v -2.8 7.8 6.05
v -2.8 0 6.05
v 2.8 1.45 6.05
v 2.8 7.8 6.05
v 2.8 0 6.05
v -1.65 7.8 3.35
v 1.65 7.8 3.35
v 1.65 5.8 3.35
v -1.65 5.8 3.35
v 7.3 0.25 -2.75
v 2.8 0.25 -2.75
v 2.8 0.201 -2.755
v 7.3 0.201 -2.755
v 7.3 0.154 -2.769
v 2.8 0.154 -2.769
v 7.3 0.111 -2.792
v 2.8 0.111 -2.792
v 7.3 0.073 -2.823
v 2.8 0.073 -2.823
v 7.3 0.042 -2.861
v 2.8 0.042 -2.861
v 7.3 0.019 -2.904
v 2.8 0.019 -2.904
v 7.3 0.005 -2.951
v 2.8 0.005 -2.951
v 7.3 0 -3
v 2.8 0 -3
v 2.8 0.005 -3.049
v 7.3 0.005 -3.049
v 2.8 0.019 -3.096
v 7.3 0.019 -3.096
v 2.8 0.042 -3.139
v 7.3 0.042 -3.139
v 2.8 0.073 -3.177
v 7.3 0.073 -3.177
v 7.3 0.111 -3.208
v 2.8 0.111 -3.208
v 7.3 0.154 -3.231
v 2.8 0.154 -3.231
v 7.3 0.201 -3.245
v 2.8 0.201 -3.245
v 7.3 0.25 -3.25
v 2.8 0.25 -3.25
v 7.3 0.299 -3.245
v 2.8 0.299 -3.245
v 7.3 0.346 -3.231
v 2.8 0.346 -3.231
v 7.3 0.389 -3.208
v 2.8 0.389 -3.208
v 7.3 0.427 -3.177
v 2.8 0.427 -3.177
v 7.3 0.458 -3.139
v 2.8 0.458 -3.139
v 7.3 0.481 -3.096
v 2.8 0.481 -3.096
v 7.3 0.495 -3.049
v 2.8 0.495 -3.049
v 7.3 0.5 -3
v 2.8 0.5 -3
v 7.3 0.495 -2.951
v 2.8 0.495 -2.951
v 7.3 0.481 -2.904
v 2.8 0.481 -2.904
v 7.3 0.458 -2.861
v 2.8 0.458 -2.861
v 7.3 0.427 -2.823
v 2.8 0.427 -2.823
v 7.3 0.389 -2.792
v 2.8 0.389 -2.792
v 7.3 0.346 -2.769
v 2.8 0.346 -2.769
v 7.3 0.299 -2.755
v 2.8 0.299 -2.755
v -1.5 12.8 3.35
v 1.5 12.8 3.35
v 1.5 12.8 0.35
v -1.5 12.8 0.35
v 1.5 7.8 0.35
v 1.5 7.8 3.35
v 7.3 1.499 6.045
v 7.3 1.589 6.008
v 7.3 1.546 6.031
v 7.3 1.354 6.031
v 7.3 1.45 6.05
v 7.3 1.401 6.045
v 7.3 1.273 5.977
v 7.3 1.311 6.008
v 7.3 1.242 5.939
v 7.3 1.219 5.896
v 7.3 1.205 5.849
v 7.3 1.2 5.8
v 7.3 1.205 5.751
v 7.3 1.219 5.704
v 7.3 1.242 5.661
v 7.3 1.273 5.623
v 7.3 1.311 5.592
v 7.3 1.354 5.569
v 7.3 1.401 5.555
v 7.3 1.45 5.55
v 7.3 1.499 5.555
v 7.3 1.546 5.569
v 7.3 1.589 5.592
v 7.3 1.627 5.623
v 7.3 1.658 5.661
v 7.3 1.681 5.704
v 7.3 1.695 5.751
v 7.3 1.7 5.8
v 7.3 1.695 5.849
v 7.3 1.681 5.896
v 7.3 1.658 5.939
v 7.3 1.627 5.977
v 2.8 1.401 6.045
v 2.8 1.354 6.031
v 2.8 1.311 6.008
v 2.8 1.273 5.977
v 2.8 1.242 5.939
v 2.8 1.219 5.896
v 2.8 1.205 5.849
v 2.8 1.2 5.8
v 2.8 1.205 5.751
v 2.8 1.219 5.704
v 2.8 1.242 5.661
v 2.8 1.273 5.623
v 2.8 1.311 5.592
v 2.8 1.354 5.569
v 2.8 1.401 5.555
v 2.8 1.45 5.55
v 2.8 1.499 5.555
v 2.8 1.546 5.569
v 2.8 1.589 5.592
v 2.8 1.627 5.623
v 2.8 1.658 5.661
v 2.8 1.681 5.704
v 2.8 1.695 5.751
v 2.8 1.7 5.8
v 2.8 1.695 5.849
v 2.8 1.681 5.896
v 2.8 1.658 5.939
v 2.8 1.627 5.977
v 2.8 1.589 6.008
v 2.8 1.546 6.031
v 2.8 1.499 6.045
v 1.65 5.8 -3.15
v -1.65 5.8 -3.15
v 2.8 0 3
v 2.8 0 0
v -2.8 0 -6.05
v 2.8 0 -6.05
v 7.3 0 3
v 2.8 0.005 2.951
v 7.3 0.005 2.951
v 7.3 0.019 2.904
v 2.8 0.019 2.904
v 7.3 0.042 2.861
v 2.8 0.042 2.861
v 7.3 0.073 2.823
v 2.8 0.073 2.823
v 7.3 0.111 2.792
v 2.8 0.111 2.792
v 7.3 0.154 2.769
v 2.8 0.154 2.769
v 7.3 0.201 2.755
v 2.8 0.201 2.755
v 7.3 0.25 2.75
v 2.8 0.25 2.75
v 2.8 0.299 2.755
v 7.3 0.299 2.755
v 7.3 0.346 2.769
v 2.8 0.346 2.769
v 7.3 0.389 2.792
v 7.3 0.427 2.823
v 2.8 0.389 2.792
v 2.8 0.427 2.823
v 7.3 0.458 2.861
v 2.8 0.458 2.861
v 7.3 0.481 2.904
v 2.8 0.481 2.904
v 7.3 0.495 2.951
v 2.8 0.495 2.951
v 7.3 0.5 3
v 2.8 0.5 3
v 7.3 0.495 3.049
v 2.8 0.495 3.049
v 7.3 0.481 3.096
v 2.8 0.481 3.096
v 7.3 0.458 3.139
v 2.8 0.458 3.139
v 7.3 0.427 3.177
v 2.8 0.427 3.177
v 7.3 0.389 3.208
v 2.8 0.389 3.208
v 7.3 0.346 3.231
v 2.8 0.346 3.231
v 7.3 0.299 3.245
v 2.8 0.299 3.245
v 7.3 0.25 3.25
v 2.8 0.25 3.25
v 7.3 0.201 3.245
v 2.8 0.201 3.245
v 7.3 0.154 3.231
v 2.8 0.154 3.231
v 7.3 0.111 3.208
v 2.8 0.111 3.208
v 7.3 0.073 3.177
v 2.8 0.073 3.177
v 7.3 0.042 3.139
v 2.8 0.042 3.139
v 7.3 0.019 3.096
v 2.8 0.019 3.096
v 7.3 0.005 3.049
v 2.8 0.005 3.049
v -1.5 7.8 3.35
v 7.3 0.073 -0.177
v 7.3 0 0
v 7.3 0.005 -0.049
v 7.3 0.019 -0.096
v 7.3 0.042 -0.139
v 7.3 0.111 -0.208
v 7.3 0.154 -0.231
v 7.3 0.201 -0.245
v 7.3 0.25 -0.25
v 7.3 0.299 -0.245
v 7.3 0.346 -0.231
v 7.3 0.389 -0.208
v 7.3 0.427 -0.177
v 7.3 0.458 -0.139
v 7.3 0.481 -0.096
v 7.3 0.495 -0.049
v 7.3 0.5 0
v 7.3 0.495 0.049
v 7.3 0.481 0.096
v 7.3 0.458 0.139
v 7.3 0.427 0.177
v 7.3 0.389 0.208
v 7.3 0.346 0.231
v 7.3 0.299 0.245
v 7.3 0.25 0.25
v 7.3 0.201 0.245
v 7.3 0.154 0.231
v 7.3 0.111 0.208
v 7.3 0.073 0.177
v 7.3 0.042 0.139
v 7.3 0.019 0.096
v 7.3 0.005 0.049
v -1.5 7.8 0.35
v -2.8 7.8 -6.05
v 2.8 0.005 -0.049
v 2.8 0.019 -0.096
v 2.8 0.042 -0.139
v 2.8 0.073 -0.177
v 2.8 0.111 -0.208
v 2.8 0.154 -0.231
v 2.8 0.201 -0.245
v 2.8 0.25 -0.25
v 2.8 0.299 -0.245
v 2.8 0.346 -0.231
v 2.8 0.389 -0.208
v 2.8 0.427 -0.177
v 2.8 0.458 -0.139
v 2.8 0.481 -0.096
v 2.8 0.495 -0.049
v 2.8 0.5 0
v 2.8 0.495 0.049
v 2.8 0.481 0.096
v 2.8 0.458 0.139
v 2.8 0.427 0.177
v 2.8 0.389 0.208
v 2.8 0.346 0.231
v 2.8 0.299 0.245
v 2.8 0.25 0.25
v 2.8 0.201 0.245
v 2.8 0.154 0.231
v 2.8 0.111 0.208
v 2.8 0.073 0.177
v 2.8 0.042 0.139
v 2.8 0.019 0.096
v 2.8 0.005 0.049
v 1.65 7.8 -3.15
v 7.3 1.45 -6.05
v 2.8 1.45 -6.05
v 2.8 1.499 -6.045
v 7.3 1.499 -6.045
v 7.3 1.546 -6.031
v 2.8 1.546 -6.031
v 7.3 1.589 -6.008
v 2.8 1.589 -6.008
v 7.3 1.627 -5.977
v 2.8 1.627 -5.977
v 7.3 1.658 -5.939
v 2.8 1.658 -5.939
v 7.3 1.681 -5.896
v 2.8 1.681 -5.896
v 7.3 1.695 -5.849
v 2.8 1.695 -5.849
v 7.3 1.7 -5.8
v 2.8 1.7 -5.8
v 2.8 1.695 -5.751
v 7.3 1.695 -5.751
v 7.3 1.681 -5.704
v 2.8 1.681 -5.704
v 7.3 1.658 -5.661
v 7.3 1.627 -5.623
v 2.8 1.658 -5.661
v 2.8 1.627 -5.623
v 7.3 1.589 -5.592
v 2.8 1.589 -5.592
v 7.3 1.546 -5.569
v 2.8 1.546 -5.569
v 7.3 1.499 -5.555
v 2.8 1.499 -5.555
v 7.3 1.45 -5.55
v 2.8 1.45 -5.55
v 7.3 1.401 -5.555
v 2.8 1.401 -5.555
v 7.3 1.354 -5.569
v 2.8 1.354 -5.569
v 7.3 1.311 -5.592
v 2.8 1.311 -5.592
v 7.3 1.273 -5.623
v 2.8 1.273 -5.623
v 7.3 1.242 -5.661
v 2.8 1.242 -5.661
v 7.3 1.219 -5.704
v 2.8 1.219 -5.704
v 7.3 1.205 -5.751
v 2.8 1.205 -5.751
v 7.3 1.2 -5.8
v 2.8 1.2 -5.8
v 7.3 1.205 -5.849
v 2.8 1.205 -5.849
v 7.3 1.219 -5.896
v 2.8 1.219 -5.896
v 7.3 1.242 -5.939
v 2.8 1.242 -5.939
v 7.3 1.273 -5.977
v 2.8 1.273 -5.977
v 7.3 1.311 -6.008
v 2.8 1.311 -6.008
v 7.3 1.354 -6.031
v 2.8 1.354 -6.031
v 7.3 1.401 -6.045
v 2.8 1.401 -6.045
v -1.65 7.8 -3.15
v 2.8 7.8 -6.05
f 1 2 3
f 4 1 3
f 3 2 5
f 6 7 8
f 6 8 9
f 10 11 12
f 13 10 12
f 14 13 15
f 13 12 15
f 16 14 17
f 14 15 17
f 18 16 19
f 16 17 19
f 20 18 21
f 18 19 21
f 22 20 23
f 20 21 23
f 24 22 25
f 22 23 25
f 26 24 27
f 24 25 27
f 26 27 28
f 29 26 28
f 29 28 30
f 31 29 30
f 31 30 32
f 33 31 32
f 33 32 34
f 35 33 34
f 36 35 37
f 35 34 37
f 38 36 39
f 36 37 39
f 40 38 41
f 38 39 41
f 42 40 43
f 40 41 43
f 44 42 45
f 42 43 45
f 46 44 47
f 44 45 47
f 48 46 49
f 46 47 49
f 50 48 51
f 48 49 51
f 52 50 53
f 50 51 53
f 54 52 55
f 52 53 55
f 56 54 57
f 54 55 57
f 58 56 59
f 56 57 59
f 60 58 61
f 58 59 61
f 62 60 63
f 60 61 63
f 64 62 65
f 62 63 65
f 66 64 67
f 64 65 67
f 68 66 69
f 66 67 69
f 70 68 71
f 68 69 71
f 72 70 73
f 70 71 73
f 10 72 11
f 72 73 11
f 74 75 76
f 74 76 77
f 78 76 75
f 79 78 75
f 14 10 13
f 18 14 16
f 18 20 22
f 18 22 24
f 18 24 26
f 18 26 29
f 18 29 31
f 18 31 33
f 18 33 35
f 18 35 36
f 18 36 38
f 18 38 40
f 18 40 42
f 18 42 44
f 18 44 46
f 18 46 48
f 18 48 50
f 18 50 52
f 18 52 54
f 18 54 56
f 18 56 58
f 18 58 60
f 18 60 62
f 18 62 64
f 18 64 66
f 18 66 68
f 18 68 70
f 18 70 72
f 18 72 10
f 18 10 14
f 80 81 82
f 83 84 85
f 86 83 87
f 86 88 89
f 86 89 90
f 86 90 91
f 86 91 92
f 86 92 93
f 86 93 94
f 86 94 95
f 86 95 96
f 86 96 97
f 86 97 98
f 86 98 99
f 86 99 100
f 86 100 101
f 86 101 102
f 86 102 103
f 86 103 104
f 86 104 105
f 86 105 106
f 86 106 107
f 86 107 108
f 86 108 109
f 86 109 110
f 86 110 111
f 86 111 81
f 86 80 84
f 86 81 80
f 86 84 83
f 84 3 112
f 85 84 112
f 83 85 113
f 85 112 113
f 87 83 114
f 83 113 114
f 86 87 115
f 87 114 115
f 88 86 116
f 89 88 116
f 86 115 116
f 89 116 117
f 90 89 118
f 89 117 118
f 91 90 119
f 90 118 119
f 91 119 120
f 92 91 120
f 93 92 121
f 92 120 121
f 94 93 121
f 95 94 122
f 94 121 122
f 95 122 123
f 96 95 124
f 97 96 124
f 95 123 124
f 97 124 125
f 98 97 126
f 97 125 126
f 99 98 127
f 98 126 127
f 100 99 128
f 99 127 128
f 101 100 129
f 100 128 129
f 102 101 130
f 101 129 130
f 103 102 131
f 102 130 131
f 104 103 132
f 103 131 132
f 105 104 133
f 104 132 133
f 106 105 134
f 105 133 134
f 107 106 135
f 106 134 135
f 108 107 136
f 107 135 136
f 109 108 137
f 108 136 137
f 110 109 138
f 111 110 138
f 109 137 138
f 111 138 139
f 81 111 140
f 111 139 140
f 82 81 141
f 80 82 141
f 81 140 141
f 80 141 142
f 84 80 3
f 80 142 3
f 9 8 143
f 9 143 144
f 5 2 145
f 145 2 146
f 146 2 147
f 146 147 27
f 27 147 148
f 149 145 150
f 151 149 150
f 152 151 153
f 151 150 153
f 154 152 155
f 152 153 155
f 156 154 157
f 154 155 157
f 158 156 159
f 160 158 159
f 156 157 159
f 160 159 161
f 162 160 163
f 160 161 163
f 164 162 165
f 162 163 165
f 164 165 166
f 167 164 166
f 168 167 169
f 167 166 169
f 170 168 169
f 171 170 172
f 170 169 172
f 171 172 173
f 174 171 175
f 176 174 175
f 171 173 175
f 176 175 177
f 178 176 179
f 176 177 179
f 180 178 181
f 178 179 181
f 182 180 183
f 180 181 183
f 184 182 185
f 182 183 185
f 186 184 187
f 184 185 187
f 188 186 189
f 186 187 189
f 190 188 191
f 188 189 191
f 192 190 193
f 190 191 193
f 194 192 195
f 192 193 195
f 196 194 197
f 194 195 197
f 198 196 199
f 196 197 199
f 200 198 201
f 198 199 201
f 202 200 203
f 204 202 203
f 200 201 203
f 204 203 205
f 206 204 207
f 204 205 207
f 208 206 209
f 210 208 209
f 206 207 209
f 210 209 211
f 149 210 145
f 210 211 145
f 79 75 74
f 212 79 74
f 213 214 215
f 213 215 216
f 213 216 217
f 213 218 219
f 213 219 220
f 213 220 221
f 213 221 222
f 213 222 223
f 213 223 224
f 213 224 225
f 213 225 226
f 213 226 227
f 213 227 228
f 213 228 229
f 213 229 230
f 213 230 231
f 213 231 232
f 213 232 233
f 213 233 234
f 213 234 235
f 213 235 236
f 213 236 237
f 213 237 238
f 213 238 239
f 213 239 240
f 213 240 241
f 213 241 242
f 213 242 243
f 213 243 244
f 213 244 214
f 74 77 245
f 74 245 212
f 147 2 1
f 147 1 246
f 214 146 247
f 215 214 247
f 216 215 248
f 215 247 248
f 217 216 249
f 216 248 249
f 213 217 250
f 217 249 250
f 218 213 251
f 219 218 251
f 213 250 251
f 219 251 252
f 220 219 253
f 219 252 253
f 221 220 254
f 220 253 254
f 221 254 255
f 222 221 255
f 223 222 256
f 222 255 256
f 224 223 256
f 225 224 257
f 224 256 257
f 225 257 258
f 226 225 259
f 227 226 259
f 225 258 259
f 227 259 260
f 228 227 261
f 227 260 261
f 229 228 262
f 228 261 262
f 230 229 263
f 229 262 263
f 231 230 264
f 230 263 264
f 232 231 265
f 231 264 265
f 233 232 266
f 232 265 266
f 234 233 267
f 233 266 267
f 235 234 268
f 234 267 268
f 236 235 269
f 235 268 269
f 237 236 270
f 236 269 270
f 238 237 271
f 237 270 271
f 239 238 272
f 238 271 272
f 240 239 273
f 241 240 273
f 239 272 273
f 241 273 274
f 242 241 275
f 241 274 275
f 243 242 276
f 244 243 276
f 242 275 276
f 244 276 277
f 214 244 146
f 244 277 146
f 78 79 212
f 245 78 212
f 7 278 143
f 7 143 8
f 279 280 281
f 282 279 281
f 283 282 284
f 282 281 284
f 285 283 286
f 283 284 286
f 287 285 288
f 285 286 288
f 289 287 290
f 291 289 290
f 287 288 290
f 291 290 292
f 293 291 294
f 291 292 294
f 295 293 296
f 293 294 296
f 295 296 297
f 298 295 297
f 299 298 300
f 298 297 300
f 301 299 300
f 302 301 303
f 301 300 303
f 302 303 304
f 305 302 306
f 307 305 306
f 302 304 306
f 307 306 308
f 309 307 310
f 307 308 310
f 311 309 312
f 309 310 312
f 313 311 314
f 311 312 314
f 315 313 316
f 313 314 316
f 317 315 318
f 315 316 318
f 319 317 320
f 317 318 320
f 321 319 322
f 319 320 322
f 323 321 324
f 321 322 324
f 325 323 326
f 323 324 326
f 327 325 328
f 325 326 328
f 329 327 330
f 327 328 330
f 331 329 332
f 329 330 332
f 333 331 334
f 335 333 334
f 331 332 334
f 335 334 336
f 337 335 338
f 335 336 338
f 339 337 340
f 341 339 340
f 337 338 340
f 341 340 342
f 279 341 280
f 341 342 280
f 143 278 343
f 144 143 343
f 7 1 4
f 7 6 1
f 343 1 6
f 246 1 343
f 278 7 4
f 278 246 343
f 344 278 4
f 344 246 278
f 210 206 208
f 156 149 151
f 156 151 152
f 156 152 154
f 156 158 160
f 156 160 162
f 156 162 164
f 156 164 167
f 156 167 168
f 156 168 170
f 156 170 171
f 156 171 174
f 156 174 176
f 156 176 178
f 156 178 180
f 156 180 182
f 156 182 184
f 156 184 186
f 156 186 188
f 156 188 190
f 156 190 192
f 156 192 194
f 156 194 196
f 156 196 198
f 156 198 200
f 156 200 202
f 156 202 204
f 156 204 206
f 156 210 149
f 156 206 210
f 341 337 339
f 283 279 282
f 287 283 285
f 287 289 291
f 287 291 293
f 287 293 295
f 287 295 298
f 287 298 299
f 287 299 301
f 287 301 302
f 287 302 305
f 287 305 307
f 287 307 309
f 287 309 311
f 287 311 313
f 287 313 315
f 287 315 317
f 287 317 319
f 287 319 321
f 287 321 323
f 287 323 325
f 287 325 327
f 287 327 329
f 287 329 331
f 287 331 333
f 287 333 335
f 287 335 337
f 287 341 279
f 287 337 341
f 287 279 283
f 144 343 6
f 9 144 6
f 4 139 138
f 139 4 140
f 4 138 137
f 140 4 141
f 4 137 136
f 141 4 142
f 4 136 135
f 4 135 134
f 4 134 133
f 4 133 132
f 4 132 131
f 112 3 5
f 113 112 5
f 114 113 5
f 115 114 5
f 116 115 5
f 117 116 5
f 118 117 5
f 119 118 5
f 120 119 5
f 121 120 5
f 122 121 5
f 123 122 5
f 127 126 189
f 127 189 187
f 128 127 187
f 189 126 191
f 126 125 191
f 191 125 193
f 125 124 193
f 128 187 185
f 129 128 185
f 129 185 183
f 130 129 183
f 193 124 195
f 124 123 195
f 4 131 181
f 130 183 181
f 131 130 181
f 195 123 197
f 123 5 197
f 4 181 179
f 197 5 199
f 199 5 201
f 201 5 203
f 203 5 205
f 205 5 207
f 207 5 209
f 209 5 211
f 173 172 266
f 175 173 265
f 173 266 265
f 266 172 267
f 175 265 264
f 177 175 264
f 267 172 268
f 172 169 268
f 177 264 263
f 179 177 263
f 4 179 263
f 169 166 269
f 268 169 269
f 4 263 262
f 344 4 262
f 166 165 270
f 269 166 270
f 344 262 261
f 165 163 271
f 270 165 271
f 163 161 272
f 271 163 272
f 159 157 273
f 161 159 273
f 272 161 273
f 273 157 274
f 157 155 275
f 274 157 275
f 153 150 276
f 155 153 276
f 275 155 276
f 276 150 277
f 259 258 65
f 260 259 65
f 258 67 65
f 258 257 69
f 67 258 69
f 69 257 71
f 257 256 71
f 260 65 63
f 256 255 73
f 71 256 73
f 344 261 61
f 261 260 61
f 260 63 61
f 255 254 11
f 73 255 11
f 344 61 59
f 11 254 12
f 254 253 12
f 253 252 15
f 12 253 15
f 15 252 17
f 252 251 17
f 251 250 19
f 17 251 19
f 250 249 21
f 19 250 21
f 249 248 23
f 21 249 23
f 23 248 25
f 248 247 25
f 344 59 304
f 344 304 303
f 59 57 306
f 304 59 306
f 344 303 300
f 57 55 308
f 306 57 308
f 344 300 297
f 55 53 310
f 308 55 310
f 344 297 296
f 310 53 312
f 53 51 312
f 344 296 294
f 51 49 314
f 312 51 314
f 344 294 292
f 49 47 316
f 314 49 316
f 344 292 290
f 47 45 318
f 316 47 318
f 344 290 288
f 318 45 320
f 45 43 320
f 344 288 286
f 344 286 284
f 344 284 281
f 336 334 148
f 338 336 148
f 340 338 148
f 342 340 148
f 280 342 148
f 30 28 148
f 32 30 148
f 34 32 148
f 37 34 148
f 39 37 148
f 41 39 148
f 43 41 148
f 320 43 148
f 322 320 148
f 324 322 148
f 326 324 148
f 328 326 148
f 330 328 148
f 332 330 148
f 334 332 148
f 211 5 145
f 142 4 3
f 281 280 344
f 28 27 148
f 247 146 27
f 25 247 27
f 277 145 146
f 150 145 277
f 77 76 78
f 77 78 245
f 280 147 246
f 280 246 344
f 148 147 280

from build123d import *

# Parameters (mm, degrees)
SKETCH_1_W          = 5.6
SKETCH_1_H          = 12.1
EXTRUDE_1_DEPTH     = 7.8
SKETCH_2_W          = 3
SKETCH_2_H          = 3
EXTRUDE_2_DEPTH     = 5
SKETCH_3_R          = 0.25
EXTRUDE_3_DEPTH     = 4.5
SKETCH_5_W          = 3.3
SKETCH_5_H          = 6.5
CUT_EXTRUDE_1_DEPTH = 2


with BuildPart() as part:
    # 草图1 → 拉伸1 (new body)
    with BuildSketch(Plane(origin=(0, 0, 0), x_dir=(1, 0, 0), z_dir=(0, 1, 0))):
        Rectangle(SKETCH_1_W, SKETCH_1_H)
    extrude(amount=EXTRUDE_1_DEPTH)

    # 草图2 → 拉伸2 (add)
    with BuildSketch(Plane(origin=(0, 7.8, 0), x_dir=(-1, 0, 0), z_dir=(0, 1, 0))):
        with Locations((0, 1.85)):
            Rectangle(SKETCH_2_W, SKETCH_2_H)
    extrude(amount=EXTRUDE_2_DEPTH)

    # 草图3 → 拉伸3 (add)
    with BuildSketch(Plane(origin=(2.8, 0, 0), x_dir=(0, 0, -1), z_dir=(1, 0, 0))):
        with Locations(Location((-3, 0.25, 0), (0, 0, 270))):
            Circle(SKETCH_3_R)
        with Locations(Location((0, 0.25, 0), (0, 0, 270))):
            Circle(SKETCH_3_R)
        with Locations(Location((3, 0.25, 0), (0, 0, 180))):
            Circle(SKETCH_3_R)
        with Locations((5.8, 1.45)):
            Circle(SKETCH_3_R)
        with Locations(Location((-5.8, 1.45, 0), (0, 0, 180))):
            Circle(SKETCH_3_R)
    extrude(amount=EXTRUDE_3_DEPTH)

    # 草图5 → 切除-拉伸1 (cut)
    with BuildSketch(Plane(origin=(0, 7.8, 0), x_dir=(-1, 0, 0), z_dir=(0, 1, 0))):
        with Locations((0, 0.1)):
            Rectangle(SKETCH_5_W, SKETCH_5_H)
    extrude(amount=-CUT_EXTRUDE_1_DEPTH, mode=Mode.SUBTRACT)


with BuildPart() as cut_extrude_1_piece_1:
    # of the separate pieces the step leaves, piece 1, a body of its own (cut_extrude_1_pieces)
    add(part.part.solids().sort_by_distance((-2.8, 0, -6.05))[0])


with BuildPart() as cut_extrude_1_piece_2:
    # of the separate pieces the step leaves, piece 2, a body of its own (cut_extrude_1_pieces)
    add(part.part.solids().sort_by_distance((-1.5, 12.8, 3.35))[0])


solid = Compound([cut_extrude_1_piece_1.part, cut_extrude_1_piece_2.part])
